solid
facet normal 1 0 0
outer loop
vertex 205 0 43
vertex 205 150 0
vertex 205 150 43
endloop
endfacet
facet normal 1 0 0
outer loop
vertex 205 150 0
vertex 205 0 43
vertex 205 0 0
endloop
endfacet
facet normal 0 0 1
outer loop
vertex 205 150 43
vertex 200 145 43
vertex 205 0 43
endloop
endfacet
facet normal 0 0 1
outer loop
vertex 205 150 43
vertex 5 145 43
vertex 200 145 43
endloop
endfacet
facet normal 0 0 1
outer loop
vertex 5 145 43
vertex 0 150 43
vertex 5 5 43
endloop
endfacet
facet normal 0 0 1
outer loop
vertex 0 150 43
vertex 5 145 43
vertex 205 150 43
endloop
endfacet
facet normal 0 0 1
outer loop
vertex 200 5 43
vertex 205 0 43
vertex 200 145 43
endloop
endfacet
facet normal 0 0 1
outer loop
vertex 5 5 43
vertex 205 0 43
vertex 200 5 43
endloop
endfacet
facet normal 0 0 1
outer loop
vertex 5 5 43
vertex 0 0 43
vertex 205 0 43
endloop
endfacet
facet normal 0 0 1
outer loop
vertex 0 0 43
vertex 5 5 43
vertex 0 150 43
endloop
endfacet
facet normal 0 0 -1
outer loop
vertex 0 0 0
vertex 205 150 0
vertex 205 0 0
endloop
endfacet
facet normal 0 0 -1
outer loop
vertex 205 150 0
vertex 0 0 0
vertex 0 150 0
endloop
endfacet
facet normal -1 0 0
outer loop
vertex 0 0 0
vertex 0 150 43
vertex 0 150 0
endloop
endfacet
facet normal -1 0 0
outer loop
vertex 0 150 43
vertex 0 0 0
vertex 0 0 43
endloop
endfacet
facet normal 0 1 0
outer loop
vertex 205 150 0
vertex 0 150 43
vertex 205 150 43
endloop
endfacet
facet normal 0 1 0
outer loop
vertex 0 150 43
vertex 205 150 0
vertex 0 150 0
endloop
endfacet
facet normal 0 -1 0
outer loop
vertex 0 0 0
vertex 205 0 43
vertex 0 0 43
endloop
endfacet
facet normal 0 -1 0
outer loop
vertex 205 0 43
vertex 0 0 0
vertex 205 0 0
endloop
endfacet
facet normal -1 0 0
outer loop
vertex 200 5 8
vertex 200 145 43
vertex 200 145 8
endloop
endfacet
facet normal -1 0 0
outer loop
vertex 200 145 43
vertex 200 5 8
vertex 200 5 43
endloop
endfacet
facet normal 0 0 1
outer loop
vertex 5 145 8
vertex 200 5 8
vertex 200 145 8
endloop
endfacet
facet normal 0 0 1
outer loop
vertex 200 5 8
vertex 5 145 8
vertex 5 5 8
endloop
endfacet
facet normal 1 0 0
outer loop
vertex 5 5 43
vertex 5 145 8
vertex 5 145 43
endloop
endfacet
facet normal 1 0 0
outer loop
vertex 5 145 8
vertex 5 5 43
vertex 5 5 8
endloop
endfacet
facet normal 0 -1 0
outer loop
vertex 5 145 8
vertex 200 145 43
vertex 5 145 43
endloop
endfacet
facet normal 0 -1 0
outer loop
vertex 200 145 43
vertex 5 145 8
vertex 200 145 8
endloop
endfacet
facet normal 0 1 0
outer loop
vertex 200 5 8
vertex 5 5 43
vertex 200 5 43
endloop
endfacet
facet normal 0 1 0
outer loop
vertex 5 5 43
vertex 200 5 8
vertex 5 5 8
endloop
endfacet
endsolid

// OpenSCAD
//
// Parametric enclosure with outer (overlap) lid — 190 x 140 x 35 inner
// Author: ChatGPT
//
// Use: set part = "bottom" or "lid", Render (F6), then File -> Export -> STL.
//
// ---------------- Parameters ----------------
part = "bottom"; // "bottom" or "lid"
orient_lid_for_print = true; // if true, flip lid so top faces bed

// Engraved text settings (concave when flipped)
lid_text = "";                 // legacy single-line (centered) text; empty disables
lid_text_depth = 1.2;          // mm depth of engraving (<= top_bottom_thick)
lid_text_size = 18;            // legacy single-line size
lid_text_font = "Liberation Sans:style=Bold"; // installed font name
lid_text_offset = [0, 0];      // XY offset for legacy single-line (mm)

// Centered title (first line)
center_title_text = "Keychron Q11 (Right)";
center_title_size = 16;        // slightly smaller than previous 18
center_title_offset = [0, 0];  // XY offset from lid center (mm)

// Bottom-right info (last two lines)
corner_info_lines = ["chenle02@gmail.com", "2025-11"];
corner_info_size = 9;          // much smaller
corner_info_margin = [5, 5];   // [x,y] margin from bottom-right edges (mm)
corner_info_line_spacing = 1.1; // spacing multiplier between lines

inner_x = 195;
inner_y = 140;
inner_z = 35;

side_wall = 5;       // side wall thickness (bottom & lid skirt)
top_bottom_thick = 8; // top/bottom plate thickness
clearance = 0.3;       // per side clearance for lid fit
lid_overlap = 12;   // skirt depth

// ---------------- Derived sizes ----------------
outer_x = inner_x + 2*side_wall;
outer_y = inner_y + 2*side_wall;
outer_z = inner_z + top_bottom_thick;

// Lid internal size (to slide over bottom outer, with clearance each side)
lid_inner_x = outer_x + 2*clearance;
lid_inner_y = outer_y + 2*clearance;
lid_inner_z = lid_overlap;

// Lid external box
lid_outer_x = lid_inner_x + 2*side_wall;
lid_outer_y = lid_inner_y + 2*side_wall;
lid_outer_z = top_bottom_thick + lid_overlap;

// ---------------- Modules ----------------
module bottom_box(){
    difference(){
        cube([outer_x, outer_y, outer_z], center=false);
        translate([side_wall, side_wall, top_bottom_thick])
            cube([inner_x, inner_y, inner_z], center=false);
    }
}

module lid_outer(){
    difference(){
        cube([lid_outer_x, lid_outer_y, lid_outer_z], center=false);
        translate([side_wall, side_wall, 0])
            cube([lid_inner_x, lid_inner_y, lid_inner_z], center=false);
        // Optional engraved text on the outer top surface
        lid_text_cut();
    }
}

// 3D volume to subtract for engraving text on the lid's top
module lid_text_cut(){
    depth = lid_text_depth > top_bottom_thick ? top_bottom_thick : lid_text_depth;

    // 1) Centered title
    if (center_title_text != ""){
        translate([ lid_outer_x/2 + center_title_offset[0],
                    lid_outer_y/2 + center_title_offset[1],
                    lid_outer_z - depth + 0.01 ])
            linear_extrude(height = depth + 0.02)
                text(center_title_text, size=center_title_size, font=lid_text_font,
                     halign="center", valign="center");
    }

    // 2) Bottom-right info lines (stack upward; last line closest to corner)
    if (len(corner_info_lines) > 0){
        for (i = [0 : len(corner_info_lines)-1]){
            line_index_from_bottom = len(corner_info_lines)-1 - i;
            yoff = corner_info_margin[1] + line_index_from_bottom * corner_info_size * corner_info_line_spacing;
            translate([ lid_outer_x - corner_info_margin[0], yoff, lid_outer_z - depth + 0.01 ])
                linear_extrude(height = depth + 0.02)
                    text(corner_info_lines[i], size=corner_info_size, font=lid_text_font,
                         halign="right", valign="bottom");
        }
    }

    // 3) Fallback: legacy single-line centered text
    if (center_title_text == "" && len(corner_info_lines) == 0 && lid_text != ""){
        translate([ lid_outer_x/2 + lid_text_offset[0],
                    lid_outer_y/2 + lid_text_offset[1],
                    lid_outer_z - depth + 0.01 ])
            linear_extrude(height = depth + 0.02)
                text(lid_text, size=lid_text_size, font=lid_text_font,
                     halign="center", valign="center");
    }
}

// ---------------- Output ----------------
if (part == "bottom"){
    bottom_box();
} else if (part == "lid"){
    // Flip so the solid top faces the build plate to avoid supports
    if (orient_lid_for_print) {
        translate([0,0,lid_outer_z])
            rotate([180,0,0]) lid_outer();
    } else {
        lid_outer();
    }
} else {
    bottom_box();
    translate([0, outer_y + 10, 0]) lid_outer();
}
